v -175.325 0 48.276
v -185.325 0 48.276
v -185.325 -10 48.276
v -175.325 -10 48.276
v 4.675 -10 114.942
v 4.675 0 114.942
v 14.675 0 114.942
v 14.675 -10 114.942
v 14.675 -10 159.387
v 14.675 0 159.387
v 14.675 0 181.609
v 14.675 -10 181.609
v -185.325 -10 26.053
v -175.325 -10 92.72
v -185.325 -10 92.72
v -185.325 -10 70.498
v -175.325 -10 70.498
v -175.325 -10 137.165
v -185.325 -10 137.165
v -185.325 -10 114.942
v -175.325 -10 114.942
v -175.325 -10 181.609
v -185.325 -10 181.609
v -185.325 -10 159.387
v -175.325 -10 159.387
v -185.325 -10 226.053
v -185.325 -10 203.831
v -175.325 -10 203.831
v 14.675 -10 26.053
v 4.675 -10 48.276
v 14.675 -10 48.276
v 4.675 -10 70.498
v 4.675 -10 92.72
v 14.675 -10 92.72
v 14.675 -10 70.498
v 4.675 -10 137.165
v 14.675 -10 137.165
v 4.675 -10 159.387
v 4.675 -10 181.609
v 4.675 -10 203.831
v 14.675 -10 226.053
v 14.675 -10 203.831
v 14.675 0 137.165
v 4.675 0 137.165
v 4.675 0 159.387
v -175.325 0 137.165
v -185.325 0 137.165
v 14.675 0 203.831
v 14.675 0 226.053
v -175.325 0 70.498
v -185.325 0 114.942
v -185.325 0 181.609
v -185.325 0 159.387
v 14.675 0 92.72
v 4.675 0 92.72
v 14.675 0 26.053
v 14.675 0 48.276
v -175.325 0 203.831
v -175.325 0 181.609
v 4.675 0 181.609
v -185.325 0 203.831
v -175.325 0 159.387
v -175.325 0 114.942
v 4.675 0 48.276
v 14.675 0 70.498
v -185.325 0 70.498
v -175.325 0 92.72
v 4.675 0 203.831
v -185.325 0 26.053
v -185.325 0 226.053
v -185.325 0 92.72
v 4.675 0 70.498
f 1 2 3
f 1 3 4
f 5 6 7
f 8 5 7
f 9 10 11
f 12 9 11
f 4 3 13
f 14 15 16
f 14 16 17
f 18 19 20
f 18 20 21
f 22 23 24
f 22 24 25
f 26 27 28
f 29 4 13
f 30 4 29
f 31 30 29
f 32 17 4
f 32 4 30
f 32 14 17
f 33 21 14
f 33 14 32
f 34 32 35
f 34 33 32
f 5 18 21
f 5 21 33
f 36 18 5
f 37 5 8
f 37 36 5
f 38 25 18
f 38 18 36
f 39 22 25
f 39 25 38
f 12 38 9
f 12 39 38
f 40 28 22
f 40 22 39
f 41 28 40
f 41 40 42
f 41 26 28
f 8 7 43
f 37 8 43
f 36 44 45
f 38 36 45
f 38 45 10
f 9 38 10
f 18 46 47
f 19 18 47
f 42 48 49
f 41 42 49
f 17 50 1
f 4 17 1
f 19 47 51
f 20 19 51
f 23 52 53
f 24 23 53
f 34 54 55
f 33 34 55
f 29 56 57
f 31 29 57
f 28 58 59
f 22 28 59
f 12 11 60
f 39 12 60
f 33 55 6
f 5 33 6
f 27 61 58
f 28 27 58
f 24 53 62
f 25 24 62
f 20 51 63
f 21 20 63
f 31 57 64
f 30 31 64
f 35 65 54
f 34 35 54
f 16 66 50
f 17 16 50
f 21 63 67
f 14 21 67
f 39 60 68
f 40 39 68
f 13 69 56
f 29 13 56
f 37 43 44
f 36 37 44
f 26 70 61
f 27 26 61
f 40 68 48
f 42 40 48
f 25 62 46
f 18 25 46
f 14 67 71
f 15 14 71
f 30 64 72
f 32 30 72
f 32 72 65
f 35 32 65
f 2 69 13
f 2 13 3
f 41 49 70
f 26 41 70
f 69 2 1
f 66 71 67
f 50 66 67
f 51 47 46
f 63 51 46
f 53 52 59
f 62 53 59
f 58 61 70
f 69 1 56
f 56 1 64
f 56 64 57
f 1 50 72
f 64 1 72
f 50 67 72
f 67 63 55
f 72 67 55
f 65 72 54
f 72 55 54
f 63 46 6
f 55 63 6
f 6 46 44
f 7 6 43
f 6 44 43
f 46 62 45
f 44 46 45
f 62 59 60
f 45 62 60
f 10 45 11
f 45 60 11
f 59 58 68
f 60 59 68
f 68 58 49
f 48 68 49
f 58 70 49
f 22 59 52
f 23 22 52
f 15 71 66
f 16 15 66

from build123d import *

# Parameters (mm, degrees)
F0_W     = 10
F0_H     = 22.222222
F1_DEPTH = 10


with BuildPart() as f1:
    # F0 (on Front) → F1 (new body)
    with BuildSketch(Plane.XZ):
        Polygon((14.674707, 226.05342), (-185.325293, 226.05342), (-185.325293, 203.831198), (-175.325293, 203.831198), (-175.325293, 181.608976), (-185.325293, 181.608976), (-185.325293, 159.386754), (-175.325293, 159.386754), (-175.325293, 137.164531), (-185.325293, 137.164531), (-185.325293, 114.942309), (-175.325293, 114.942309), (-175.325293, 92.720087), (-185.325293, 92.720087), (-185.325293, 70.497865), (-175.325293, 70.497865), (-175.325293, 48.275642), (-175.325293, 26.05342), (14.674707, 26.05342), (14.674707, 48.275642), (4.674707, 48.275642), (4.674707, 70.497865), (14.674707, 70.497865), (14.674707, 92.720087), (4.674707, 92.720087), (4.674707, 114.942309), (14.674707, 114.942309), (14.674707, 137.164531), (4.674707, 137.164531), (4.674707, 159.386754), (14.674707, 159.386754), (14.674707, 181.608976), (4.674707, 181.608976), (4.674707, 203.831198), (14.674707, 203.831198), align=None)
        with Locations((-180.325293, 37.164531)):
            Rectangle(F0_W, F0_H)
    extrude(amount=F1_DEPTH)


solid = f1.part
